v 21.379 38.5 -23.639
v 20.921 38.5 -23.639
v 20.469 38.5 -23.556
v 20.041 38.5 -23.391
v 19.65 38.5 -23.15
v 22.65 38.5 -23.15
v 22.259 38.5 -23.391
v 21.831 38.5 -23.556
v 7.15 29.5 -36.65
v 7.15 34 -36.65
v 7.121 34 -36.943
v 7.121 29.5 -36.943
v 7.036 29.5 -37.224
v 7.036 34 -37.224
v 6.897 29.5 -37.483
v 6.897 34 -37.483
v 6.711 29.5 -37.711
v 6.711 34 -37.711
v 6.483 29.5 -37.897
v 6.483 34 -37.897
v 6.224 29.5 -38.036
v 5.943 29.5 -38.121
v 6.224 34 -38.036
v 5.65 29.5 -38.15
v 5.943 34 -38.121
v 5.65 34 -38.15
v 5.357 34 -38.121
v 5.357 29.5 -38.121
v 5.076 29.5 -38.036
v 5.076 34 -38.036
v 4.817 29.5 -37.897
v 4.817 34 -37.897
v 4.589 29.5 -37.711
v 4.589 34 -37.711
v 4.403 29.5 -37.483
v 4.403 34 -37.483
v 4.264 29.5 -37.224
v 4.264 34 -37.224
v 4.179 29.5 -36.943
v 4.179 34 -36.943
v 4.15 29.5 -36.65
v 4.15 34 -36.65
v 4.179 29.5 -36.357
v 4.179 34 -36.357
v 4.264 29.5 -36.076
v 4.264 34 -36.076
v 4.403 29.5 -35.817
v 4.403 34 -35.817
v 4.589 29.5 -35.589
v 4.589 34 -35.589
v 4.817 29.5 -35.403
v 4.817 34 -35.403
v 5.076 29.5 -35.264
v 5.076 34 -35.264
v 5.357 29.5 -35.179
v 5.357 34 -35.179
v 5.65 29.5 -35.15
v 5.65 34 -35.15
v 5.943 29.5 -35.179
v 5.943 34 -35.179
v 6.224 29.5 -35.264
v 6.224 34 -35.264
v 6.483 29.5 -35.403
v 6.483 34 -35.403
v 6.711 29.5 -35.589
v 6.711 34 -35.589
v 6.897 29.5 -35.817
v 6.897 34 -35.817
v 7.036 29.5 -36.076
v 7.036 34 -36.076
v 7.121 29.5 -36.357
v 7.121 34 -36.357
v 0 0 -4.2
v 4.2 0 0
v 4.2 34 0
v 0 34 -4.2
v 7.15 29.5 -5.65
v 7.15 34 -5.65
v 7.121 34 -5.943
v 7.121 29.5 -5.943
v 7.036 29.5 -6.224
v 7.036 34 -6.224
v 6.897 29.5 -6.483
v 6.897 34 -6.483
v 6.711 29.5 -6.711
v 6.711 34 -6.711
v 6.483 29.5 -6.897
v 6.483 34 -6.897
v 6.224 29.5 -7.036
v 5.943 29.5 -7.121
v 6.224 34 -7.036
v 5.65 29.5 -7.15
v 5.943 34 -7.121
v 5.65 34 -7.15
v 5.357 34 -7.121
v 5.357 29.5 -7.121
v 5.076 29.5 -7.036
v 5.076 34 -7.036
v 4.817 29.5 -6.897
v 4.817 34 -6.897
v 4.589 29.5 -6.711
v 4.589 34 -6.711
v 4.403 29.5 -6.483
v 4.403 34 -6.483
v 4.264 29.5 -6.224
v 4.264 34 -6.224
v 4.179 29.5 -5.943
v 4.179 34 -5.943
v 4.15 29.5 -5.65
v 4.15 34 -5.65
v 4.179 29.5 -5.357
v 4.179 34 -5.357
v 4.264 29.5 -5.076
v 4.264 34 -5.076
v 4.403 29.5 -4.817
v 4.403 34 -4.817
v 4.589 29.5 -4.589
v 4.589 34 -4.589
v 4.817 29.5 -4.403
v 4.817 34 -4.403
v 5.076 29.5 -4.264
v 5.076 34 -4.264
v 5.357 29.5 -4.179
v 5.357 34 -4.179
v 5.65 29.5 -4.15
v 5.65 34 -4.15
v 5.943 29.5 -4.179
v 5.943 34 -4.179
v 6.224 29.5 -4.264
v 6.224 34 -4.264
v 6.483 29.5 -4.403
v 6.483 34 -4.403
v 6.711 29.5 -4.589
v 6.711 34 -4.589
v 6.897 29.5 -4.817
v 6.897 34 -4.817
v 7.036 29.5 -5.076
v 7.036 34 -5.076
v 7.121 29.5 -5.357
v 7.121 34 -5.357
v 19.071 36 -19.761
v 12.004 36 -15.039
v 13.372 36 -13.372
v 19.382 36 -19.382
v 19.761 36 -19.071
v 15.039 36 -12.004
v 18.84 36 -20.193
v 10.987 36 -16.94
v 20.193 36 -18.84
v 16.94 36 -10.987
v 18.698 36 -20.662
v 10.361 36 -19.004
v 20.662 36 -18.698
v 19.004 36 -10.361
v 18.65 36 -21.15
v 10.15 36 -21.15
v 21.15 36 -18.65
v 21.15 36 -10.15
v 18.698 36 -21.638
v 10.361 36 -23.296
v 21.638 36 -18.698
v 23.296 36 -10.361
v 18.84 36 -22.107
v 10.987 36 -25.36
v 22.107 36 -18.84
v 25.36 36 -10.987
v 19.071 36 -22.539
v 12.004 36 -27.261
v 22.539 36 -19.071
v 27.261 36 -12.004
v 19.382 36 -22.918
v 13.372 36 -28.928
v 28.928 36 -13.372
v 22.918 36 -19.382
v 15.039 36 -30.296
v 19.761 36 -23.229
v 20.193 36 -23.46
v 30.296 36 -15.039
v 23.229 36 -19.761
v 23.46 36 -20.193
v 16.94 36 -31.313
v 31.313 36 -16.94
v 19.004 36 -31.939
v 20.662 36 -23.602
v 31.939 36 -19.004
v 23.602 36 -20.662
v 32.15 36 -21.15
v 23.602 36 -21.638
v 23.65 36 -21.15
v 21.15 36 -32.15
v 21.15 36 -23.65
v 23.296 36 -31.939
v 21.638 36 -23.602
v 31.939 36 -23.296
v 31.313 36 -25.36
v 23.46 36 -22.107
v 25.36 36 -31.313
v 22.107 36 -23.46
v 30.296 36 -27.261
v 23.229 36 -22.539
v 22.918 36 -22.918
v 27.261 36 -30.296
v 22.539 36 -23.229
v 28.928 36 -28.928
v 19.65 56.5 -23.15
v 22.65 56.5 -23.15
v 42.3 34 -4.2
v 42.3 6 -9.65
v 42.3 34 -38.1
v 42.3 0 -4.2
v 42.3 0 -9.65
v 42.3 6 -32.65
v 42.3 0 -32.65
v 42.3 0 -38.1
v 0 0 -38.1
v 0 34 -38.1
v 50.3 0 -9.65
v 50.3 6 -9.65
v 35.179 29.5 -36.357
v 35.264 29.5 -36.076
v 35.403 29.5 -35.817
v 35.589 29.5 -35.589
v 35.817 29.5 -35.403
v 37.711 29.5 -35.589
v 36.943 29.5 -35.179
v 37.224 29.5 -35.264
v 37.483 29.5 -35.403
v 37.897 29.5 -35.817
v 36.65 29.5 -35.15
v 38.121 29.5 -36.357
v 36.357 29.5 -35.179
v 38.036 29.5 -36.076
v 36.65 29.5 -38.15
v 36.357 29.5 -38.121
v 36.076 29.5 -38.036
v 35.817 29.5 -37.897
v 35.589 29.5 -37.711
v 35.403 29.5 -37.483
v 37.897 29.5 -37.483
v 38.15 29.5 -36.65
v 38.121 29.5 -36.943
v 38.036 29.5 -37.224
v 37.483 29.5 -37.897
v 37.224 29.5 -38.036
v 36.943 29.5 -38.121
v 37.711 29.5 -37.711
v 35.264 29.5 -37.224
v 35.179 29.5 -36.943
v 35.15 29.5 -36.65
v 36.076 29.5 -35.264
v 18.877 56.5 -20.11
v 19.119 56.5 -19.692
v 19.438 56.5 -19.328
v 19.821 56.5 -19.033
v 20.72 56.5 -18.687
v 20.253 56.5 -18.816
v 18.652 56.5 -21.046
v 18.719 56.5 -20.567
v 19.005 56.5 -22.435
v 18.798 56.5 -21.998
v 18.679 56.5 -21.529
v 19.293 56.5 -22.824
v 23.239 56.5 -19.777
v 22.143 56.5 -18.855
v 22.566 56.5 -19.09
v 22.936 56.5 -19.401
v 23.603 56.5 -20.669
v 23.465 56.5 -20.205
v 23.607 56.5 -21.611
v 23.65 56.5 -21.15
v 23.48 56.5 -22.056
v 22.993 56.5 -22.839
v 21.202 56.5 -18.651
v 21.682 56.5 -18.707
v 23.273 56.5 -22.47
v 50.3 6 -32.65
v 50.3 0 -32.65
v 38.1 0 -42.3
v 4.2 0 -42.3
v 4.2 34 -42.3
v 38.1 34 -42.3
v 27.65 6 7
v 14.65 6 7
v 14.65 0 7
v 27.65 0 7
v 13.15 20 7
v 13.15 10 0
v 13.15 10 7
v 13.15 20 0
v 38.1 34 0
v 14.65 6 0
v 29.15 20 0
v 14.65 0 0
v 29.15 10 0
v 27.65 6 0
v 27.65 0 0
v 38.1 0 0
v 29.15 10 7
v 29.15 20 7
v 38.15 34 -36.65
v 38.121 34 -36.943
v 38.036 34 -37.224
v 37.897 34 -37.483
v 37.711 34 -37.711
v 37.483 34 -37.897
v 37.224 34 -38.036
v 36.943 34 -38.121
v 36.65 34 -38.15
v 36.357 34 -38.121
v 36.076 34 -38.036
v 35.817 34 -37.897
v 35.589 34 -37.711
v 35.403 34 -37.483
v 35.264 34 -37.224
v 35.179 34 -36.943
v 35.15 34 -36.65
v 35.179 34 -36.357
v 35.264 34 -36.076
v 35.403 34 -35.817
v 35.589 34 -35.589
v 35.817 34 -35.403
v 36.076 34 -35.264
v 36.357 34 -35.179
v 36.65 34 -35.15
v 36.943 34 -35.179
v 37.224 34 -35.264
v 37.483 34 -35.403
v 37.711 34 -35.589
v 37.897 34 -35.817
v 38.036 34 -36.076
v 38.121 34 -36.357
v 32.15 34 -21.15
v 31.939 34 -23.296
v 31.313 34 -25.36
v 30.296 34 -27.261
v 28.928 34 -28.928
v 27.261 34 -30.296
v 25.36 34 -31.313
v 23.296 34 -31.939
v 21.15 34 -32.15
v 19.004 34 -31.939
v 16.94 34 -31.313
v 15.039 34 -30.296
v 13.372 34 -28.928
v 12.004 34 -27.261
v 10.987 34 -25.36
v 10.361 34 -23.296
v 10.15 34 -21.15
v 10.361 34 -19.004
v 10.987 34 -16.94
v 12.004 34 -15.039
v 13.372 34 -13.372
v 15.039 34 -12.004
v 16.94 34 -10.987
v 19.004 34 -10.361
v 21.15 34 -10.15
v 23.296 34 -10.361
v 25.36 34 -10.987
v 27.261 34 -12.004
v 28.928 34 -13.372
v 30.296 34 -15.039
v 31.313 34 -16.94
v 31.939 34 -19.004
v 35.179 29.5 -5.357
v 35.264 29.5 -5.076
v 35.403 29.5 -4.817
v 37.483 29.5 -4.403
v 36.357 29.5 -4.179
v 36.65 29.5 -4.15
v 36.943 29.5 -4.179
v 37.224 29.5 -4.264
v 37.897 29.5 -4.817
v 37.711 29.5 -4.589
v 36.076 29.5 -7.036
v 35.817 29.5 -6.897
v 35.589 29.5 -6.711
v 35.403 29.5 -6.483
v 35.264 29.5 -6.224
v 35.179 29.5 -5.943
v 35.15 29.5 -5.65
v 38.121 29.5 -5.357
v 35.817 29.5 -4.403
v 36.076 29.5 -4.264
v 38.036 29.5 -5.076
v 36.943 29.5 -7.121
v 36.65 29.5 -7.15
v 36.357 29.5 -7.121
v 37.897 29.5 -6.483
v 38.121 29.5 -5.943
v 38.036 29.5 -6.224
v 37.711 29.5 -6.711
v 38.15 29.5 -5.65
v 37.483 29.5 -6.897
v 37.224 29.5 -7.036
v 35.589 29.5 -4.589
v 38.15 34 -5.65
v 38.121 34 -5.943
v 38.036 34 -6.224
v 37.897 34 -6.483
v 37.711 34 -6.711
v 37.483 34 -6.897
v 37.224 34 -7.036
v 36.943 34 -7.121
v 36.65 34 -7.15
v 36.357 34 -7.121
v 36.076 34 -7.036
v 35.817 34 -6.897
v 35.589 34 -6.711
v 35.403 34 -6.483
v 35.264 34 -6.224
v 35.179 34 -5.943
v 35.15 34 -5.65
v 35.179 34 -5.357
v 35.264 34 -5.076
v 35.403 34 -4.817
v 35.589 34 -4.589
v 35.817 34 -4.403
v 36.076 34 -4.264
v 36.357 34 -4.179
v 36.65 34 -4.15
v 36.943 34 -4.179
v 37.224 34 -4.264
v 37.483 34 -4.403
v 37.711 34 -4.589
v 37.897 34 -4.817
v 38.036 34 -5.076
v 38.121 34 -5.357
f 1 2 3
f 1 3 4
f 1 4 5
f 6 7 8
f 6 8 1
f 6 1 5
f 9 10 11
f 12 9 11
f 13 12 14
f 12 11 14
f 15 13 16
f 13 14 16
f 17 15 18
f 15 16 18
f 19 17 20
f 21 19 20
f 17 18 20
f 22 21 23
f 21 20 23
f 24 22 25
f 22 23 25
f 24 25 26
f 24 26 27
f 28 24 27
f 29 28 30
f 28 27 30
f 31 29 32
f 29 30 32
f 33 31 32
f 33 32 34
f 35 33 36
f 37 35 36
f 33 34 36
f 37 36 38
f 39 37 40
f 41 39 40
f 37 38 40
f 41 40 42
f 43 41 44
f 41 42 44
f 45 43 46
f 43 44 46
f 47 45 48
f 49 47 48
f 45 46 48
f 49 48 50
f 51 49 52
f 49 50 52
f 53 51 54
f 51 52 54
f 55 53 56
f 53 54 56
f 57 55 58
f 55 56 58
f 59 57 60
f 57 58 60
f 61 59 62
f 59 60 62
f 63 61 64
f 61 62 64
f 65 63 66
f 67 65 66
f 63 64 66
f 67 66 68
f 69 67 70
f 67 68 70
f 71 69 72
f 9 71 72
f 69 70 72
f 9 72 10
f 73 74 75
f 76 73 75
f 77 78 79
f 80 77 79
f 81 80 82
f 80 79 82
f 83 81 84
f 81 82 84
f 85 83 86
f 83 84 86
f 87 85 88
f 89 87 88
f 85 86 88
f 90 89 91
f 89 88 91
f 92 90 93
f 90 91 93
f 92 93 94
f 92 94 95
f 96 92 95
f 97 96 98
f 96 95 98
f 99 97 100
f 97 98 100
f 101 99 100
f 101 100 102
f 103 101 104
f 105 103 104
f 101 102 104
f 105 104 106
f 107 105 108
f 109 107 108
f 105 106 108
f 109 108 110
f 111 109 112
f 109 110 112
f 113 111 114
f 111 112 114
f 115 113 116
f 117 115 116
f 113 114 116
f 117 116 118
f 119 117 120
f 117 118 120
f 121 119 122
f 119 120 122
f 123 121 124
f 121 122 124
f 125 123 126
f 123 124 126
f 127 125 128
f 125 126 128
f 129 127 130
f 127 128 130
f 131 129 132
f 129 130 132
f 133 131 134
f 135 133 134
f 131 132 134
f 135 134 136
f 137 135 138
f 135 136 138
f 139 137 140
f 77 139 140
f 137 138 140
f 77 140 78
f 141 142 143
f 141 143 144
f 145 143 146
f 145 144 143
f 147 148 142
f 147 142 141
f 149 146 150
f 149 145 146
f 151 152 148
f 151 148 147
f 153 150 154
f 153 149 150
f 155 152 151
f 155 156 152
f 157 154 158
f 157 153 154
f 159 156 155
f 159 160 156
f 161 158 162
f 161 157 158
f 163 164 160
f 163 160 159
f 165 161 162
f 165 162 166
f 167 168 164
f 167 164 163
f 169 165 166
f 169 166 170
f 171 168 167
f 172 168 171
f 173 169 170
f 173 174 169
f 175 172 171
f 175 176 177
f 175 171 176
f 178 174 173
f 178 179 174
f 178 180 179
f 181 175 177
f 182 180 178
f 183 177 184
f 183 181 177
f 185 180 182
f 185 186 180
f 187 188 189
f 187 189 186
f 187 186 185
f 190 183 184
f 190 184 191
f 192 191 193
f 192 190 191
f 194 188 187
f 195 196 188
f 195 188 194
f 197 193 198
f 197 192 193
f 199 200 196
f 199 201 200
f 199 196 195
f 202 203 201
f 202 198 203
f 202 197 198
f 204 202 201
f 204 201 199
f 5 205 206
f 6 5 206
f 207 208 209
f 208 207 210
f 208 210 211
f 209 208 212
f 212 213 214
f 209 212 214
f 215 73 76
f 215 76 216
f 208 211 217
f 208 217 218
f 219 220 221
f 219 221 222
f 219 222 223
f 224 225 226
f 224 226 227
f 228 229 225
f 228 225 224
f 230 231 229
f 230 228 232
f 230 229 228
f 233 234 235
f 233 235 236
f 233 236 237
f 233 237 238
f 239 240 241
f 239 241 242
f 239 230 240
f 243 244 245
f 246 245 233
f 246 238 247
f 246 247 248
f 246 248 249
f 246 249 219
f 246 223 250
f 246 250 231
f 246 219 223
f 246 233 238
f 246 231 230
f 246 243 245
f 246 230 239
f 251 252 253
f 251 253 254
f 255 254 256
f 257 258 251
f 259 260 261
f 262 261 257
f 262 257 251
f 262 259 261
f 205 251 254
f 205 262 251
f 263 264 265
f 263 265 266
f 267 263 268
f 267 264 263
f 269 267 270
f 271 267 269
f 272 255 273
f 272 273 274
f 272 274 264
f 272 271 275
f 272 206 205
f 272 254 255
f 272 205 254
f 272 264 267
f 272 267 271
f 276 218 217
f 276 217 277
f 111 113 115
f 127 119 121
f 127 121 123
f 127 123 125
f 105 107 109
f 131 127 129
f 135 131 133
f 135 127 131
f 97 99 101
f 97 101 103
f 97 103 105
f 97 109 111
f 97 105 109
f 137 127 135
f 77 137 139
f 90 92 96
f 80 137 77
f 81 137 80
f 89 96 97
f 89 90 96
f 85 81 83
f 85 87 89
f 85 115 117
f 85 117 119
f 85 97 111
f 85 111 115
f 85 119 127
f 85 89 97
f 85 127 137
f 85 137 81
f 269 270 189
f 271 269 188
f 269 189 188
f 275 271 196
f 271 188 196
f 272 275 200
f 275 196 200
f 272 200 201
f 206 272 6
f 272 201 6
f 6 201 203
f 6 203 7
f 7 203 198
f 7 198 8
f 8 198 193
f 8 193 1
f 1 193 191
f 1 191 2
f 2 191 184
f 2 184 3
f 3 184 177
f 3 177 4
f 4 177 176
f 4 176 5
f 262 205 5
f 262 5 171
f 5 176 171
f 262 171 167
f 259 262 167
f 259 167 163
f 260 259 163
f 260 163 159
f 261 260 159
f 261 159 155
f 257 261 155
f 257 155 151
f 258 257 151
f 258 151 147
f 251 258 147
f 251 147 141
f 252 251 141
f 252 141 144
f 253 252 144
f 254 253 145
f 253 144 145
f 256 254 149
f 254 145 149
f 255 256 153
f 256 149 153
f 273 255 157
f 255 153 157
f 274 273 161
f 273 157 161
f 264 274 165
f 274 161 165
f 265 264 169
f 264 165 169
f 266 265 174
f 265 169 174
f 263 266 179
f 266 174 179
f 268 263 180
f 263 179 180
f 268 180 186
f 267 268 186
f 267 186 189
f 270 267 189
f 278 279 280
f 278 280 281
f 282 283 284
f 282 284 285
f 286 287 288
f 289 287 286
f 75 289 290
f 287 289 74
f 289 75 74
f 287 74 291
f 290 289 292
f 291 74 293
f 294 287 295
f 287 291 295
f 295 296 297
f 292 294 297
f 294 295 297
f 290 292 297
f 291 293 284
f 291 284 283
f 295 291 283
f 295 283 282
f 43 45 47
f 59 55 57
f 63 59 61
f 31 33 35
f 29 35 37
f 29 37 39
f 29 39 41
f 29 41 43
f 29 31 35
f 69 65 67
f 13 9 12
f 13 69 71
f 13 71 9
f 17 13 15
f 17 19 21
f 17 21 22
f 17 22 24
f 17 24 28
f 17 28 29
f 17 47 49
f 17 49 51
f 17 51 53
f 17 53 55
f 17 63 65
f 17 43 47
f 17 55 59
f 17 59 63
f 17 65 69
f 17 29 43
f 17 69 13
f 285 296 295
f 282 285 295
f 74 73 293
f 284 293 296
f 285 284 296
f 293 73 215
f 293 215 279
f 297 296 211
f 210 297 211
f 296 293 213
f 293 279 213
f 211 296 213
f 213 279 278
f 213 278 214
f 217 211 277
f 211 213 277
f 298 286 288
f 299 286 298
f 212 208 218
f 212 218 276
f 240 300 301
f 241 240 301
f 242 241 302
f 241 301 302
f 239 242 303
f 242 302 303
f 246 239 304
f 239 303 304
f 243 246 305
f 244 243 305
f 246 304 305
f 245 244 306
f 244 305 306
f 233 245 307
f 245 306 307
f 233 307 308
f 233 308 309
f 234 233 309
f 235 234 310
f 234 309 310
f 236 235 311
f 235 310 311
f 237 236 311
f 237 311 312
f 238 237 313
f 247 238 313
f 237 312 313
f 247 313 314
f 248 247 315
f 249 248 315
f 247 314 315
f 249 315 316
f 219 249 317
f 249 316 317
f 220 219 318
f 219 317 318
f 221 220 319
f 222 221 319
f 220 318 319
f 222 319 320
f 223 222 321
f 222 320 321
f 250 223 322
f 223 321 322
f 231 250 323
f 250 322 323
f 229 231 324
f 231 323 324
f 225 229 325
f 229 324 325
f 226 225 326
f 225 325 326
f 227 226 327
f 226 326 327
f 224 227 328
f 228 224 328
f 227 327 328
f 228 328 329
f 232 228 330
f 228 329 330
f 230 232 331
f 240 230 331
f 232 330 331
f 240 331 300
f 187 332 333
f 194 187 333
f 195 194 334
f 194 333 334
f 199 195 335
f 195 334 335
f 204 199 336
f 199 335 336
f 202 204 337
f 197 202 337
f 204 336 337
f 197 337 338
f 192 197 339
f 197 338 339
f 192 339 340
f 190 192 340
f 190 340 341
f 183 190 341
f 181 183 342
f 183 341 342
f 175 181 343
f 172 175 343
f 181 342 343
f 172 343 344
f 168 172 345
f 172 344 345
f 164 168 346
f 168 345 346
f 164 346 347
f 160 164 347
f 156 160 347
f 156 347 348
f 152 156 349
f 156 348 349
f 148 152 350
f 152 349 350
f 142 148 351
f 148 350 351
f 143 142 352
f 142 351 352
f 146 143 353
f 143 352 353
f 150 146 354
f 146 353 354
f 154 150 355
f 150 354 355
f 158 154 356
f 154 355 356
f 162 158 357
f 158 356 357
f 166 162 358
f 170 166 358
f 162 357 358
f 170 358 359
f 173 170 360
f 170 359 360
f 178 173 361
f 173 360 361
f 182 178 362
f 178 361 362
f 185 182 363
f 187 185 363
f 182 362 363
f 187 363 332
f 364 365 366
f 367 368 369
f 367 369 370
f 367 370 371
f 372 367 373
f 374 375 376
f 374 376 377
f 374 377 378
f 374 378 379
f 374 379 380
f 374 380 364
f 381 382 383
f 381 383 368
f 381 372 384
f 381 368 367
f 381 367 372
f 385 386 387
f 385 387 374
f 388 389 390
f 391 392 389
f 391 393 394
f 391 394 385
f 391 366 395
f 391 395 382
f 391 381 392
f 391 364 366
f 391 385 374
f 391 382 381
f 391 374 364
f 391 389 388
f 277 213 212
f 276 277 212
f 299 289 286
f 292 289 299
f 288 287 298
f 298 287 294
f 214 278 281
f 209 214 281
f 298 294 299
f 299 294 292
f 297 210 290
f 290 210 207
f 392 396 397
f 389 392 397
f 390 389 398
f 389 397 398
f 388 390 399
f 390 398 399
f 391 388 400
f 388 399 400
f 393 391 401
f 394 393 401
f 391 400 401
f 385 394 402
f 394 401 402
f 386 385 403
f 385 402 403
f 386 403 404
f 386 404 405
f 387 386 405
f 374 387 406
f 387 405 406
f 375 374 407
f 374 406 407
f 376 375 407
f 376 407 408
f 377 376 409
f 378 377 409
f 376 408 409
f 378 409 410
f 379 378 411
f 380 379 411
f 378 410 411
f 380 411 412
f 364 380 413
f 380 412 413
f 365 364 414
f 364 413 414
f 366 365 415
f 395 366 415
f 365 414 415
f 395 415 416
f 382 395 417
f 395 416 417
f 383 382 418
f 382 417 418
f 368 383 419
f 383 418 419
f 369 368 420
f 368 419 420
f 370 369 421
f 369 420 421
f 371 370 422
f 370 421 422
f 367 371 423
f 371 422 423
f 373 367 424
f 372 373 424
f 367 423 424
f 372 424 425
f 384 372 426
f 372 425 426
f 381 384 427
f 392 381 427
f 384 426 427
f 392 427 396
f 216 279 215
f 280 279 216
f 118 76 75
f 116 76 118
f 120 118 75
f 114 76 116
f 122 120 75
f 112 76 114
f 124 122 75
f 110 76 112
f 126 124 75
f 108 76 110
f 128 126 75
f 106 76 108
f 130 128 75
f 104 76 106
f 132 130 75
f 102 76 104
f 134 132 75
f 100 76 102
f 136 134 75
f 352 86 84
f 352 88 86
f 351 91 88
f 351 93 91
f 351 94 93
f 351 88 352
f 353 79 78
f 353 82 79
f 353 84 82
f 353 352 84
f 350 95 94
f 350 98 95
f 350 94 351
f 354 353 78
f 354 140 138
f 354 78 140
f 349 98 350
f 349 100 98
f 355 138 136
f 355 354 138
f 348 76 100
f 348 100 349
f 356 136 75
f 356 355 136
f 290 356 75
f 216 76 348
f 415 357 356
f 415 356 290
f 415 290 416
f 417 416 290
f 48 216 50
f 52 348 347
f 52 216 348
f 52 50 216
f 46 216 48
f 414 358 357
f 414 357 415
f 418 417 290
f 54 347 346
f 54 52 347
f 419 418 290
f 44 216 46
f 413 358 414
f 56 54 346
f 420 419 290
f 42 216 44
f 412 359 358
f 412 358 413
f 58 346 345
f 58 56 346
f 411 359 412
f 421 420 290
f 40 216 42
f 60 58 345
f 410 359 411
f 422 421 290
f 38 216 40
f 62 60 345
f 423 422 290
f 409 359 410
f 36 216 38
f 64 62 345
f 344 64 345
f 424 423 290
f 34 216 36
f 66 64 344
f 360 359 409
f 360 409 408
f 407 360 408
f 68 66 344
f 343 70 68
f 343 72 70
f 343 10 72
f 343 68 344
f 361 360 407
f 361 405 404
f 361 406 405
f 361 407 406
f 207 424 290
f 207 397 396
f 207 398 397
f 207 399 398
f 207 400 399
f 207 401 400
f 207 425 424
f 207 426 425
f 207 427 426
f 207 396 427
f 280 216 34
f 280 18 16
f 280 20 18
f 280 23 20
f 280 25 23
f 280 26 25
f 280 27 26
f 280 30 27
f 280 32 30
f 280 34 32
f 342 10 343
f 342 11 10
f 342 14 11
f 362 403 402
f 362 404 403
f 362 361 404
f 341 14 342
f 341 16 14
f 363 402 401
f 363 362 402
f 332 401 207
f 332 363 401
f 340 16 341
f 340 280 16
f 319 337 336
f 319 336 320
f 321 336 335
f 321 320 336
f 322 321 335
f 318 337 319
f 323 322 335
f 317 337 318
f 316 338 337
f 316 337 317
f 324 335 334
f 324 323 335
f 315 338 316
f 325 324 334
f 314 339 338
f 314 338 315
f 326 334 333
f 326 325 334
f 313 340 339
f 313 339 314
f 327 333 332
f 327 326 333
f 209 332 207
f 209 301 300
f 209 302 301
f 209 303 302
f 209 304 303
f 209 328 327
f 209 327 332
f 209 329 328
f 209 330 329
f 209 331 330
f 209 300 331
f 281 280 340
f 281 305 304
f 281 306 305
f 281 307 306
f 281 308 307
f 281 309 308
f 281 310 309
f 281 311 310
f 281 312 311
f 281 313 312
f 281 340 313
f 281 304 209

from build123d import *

# Parameters (mm, degrees)
SKETCH_1_W          = 42.3
SKETCH_1_H          = 42.3
EXTRUDE_1_DEPTH     = 34
CHAMFER_1_SIZE      = 4.2
SKETCH_2_R          = 1.5
CUT_EXTRUDE_1_DEPTH = 4.5
SKETCH_3_R          = 11
EXTRUDE_2_DEPTH     = 2
SKETCH_4_R          = 2.5
EXTRUDE_3_DEPTH     = 20.5
CUT_EXTRUDE_2_DEPTH = 18
SKETCH_6_W          = 16
SKETCH_6_H          = 10
SKETCH_6_W_2        = 13
SKETCH_6_H_2        = 6
EXTRUDE_4_DEPTH     = 7
SKETCH_7_W          = 23
SKETCH_7_H          = 6
EXTRUDE_5_DEPTH     = 8


with BuildPart() as part:
    # 草图1 → 凸台-拉伸1 (new body)
    with BuildSketch(Plane(origin=(0, 0, 0), x_dir=(1, 0, 0), z_dir=(0, 1, 0))):
        with Locations((21.15, 21.15)):
            Rectangle(SKETCH_1_W, SKETCH_1_H)
    extrude(amount=EXTRUDE_1_DEPTH)

    # 倒角1
    chamfer_1_edges = [part.edges().sort_by_distance(p)[0] for p in [
        (0, 17, -42.3),
        (42.3, 17, -42.3),
        (42.3, 17, 0),
        (0, 17, 0),
    ]]
    chamfer(chamfer_1_edges, length=CHAMFER_1_SIZE)

    # 草图2 → 切除-拉伸1 (cut)
    with BuildSketch(Plane(origin=(0, 34, 0), x_dir=(1, 0, 0), z_dir=(0, 1, 0))):
        with Locations((5.65, 36.65)):
            Circle(SKETCH_2_R)
        with Locations((36.65, 36.65)):
            Circle(SKETCH_2_R)
        with Locations((5.65, 5.65)):
            Circle(SKETCH_2_R)
        with Locations((36.65, 5.65)):
            Circle(SKETCH_2_R)
    extrude(amount=-CUT_EXTRUDE_1_DEPTH, mode=Mode.SUBTRACT)

    # 草图3 → 凸台-拉伸2 (add)
    with BuildSketch(Plane(origin=(0, 34, 0), x_dir=(1, 0, 0), z_dir=(0, 1, 0))):
        with Locations((21.15, 21.15)):
            Circle(SKETCH_3_R)
    extrude(amount=EXTRUDE_2_DEPTH)

    # 草图4 → 凸台-拉伸3 (add)
    with BuildSketch(Plane(origin=(0, 36, 0), x_dir=(1, 0, 0), z_dir=(0, 1, 0))):
        with Locations((21.15, 21.15)):
            Circle(SKETCH_4_R)
    extrude(amount=EXTRUDE_3_DEPTH)

    # 草图5 → 切除-拉伸2 (cut)
    with BuildSketch(Plane(origin=(0, 56.5, 0), x_dir=(1, 0, 0), z_dir=(0, 1, 0))):
        with BuildLine():
            Line((19.65, 23.15), (22.65, 23.15))
            ThreePointArc((22.65, 23.15), (21.15, 23.65), (19.65, 23.15))
        make_face()
    extrude(amount=-CUT_EXTRUDE_2_DEPTH, mode=Mode.SUBTRACT)

    # 草图6 → 凸台-拉伸4 (add)
    with BuildSketch(Plane.XY):
        with Locations((21.15, 15)):
            Rectangle(SKETCH_6_W, SKETCH_6_H)
        with Locations((21.15, 3)):
            Rectangle(SKETCH_6_W_2, SKETCH_6_H_2)
    extrude(amount=EXTRUDE_4_DEPTH)

    # 草图7 → 凸台-拉伸5 (add)
    with BuildSketch(Plane(origin=(42.3, 0, 0), x_dir=(0, 0, -1), z_dir=(1, 0, 0))):
        with Locations((21.15, 3)):
            Rectangle(SKETCH_7_W, SKETCH_7_H)
    extrude(amount=EXTRUDE_5_DEPTH)


solid = part.part
